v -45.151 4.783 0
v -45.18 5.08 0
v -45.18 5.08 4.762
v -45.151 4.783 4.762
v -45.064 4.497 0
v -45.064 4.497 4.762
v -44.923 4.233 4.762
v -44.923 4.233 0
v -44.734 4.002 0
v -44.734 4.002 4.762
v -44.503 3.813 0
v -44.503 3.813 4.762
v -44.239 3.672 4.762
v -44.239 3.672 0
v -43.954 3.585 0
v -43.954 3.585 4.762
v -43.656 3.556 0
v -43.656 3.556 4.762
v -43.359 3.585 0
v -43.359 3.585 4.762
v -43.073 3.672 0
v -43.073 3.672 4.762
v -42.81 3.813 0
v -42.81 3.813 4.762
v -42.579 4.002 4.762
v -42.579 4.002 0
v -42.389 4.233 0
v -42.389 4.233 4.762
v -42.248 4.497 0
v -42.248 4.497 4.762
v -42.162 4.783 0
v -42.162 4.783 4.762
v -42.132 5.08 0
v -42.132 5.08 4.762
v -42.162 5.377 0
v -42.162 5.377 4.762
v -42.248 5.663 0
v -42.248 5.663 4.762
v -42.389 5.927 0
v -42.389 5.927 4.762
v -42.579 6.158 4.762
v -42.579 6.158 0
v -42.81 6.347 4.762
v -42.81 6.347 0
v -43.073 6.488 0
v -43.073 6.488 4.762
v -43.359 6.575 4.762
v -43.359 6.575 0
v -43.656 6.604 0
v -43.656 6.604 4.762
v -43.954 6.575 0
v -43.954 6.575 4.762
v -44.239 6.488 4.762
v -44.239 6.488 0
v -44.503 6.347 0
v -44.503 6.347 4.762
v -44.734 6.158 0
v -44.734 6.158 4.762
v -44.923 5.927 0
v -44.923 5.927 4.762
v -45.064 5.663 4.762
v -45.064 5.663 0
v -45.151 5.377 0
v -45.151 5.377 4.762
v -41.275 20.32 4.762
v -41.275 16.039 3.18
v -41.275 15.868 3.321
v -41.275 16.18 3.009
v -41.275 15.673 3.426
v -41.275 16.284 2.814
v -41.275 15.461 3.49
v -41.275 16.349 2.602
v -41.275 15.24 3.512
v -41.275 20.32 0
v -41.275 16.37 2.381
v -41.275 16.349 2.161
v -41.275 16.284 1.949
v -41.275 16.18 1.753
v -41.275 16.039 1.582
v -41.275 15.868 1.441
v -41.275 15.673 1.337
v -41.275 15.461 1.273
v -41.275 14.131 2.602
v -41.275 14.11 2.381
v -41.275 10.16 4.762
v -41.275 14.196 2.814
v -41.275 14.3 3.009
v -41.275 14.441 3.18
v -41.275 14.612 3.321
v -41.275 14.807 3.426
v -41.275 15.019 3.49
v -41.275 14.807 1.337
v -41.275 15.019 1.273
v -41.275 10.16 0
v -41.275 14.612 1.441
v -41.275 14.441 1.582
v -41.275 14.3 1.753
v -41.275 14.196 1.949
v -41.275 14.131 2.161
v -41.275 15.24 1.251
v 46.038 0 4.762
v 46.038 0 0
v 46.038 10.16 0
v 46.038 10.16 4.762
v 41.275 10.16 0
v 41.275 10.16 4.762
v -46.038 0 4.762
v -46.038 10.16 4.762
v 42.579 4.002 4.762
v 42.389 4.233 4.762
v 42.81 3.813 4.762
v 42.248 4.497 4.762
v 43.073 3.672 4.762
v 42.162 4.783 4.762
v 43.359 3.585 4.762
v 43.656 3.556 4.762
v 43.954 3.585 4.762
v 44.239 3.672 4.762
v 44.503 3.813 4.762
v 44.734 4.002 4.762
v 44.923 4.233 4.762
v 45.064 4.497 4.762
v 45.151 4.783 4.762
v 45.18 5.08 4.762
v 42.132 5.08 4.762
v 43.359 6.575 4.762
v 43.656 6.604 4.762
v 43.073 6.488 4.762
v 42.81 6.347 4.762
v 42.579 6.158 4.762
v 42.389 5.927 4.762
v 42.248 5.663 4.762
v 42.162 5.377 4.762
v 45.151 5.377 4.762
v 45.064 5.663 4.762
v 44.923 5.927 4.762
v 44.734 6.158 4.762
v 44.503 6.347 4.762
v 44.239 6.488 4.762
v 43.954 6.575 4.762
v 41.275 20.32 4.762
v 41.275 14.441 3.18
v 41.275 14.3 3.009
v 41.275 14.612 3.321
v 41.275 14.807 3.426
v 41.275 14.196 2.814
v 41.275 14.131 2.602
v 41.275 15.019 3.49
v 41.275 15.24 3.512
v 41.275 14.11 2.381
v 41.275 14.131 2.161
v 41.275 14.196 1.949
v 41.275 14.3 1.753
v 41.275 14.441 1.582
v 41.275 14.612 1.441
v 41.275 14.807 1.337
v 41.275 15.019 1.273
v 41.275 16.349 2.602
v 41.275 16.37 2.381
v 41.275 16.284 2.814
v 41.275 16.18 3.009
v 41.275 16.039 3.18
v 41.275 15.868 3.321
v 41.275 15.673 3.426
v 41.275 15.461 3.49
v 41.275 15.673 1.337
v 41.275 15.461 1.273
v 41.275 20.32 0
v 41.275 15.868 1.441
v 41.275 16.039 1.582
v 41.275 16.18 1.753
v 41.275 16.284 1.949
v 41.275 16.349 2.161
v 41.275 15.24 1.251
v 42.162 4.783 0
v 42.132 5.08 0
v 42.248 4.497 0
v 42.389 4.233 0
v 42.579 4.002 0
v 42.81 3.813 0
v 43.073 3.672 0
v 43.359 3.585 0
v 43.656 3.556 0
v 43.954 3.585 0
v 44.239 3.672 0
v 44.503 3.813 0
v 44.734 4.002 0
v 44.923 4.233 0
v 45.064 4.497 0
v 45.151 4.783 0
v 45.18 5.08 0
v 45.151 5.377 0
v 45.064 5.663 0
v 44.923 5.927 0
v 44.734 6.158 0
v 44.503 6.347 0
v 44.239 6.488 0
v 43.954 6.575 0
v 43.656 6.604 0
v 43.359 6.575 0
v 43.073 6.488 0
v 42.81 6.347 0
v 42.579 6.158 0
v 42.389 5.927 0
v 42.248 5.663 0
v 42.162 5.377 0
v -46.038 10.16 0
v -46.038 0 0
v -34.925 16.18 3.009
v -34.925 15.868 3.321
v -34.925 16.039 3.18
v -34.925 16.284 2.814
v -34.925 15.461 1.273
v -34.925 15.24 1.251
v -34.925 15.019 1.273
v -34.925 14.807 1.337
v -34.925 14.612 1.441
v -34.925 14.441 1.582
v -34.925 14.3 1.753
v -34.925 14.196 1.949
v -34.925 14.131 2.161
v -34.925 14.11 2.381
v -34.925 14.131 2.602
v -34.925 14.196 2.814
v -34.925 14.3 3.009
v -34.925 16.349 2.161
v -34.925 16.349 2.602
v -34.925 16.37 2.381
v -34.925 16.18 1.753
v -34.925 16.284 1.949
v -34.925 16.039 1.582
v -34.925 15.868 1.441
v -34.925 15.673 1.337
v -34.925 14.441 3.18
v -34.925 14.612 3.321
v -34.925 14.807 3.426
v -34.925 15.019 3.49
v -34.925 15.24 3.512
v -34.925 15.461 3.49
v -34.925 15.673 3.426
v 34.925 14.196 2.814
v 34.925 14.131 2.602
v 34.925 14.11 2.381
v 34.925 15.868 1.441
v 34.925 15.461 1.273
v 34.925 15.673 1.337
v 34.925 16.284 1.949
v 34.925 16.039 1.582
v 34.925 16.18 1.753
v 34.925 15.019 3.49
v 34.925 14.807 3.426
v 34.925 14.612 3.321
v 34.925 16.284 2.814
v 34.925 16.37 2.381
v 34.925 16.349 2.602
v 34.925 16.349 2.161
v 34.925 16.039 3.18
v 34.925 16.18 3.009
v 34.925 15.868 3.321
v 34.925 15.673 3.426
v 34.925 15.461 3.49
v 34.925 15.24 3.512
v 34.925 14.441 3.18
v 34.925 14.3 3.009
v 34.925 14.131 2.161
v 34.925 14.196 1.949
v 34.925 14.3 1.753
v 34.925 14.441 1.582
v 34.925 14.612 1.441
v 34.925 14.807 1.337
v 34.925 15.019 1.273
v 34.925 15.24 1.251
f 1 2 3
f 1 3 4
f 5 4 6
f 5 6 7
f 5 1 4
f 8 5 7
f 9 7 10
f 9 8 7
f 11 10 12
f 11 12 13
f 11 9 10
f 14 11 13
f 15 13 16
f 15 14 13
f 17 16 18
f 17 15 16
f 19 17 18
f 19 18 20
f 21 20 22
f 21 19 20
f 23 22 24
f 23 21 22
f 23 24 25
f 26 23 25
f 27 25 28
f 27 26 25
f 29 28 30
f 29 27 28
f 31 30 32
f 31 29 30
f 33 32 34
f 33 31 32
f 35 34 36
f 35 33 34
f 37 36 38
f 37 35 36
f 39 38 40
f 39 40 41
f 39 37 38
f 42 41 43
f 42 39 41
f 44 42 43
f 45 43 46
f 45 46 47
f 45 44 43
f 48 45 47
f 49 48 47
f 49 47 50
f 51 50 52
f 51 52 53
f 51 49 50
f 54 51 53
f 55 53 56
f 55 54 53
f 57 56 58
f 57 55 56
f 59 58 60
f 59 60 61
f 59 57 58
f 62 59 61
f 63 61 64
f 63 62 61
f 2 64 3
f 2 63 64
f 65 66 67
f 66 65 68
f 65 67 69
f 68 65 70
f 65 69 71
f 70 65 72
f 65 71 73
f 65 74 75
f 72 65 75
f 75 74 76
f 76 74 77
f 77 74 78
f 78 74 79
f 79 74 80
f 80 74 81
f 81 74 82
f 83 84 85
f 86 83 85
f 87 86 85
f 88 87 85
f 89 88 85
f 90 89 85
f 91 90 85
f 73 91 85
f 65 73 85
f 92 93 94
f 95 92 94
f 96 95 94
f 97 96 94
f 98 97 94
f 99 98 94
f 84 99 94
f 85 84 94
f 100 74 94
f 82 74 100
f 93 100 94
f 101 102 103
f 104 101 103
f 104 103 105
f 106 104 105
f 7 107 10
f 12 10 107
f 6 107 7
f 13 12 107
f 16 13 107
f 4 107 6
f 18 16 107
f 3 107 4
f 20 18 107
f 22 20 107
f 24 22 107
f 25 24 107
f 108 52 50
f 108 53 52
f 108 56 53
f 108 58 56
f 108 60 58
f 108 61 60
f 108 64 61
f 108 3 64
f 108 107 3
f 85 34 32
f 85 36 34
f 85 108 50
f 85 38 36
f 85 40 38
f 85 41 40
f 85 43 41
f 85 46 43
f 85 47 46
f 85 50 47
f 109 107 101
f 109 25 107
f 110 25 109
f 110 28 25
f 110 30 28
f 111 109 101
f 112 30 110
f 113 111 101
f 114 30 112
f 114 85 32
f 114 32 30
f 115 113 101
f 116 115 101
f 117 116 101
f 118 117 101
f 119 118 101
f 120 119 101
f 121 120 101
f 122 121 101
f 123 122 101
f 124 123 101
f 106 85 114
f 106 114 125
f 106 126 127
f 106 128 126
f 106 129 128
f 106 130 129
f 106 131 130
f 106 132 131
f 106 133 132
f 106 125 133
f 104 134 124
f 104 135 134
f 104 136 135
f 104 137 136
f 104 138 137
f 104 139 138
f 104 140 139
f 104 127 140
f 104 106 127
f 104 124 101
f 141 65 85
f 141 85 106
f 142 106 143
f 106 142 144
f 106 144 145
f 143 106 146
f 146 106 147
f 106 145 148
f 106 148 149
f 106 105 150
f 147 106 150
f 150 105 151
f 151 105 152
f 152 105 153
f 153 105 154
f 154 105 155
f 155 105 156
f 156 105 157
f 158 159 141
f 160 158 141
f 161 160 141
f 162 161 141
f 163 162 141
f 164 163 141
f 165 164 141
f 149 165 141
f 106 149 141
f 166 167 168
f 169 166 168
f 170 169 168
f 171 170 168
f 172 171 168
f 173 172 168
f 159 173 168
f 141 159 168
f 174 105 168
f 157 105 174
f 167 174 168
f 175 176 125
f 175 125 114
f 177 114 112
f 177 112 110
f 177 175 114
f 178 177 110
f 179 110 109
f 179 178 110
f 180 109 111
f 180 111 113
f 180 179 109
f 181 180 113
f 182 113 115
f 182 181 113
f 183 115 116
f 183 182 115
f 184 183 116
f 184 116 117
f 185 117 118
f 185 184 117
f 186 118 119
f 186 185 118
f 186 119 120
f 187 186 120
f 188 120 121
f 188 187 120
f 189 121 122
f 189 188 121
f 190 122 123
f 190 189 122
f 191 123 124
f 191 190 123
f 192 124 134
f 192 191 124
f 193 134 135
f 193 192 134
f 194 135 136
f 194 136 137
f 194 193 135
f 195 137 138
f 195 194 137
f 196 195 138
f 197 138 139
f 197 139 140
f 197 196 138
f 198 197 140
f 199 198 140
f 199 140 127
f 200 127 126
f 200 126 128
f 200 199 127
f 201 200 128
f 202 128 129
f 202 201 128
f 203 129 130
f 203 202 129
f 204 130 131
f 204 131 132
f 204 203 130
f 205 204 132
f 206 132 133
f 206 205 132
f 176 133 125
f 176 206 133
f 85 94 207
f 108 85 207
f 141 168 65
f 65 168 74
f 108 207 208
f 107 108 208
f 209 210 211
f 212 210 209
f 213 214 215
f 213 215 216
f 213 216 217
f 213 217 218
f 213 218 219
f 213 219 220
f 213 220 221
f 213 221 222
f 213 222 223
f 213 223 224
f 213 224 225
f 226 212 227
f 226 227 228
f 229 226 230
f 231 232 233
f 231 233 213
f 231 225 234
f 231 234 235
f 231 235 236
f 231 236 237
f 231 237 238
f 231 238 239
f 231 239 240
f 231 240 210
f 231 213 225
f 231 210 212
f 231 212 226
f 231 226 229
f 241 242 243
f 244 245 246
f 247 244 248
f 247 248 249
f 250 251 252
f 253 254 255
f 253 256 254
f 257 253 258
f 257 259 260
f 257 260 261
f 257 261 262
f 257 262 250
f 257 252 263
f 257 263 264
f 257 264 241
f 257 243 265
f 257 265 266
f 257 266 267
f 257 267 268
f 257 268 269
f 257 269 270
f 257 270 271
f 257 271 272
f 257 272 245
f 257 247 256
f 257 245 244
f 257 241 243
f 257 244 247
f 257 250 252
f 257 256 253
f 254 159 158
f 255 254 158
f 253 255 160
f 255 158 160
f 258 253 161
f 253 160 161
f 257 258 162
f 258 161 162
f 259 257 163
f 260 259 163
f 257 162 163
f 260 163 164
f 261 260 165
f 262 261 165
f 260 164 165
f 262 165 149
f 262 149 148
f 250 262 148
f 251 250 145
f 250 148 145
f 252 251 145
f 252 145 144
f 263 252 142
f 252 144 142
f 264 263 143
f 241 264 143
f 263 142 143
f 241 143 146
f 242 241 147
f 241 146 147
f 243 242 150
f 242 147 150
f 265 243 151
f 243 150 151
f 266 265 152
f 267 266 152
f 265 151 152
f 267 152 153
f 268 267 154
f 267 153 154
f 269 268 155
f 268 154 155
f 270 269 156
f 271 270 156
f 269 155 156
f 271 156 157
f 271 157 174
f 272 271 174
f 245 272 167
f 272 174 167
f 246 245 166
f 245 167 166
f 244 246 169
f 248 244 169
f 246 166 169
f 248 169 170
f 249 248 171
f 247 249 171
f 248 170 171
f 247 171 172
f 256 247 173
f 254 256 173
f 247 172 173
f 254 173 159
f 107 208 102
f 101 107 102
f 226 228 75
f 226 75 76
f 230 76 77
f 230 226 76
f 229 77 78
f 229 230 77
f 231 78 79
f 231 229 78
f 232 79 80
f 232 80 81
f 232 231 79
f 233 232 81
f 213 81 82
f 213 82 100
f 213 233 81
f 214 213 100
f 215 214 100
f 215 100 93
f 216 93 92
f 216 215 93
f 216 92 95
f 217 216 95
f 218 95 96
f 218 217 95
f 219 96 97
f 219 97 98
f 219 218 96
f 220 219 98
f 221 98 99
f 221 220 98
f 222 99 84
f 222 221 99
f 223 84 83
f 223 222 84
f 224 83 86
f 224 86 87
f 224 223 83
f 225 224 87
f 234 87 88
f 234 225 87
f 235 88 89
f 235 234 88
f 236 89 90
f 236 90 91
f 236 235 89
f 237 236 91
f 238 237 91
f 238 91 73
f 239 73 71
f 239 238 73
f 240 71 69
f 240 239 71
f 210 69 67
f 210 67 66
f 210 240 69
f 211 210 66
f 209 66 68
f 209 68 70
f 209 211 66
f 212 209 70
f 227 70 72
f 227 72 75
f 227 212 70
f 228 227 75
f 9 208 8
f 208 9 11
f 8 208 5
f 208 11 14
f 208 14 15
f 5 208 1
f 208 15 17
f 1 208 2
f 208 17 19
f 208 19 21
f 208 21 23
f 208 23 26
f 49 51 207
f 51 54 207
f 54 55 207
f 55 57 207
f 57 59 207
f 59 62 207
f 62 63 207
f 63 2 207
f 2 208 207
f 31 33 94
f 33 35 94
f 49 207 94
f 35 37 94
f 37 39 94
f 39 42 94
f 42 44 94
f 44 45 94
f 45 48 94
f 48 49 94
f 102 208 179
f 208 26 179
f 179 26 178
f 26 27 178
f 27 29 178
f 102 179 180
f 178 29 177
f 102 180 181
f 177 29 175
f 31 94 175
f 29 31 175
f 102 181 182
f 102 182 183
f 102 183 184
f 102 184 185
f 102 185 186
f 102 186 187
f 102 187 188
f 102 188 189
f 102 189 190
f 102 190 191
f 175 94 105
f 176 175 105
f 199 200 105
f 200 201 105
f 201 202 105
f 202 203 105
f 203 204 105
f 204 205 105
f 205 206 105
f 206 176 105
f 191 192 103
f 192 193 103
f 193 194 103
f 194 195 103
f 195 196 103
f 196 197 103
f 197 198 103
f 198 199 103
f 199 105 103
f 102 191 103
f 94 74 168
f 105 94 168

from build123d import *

# Parameters (mm, degrees)
SKETCH1_R           = 1.524
BOSS_EXTRUDE1_DEPTH = 4.7625
SKETCH2_R           = 1.1303
CUT_EXTRUDE1_DEPTH  = 6.35
CUT_EXTRUDE2_START  = -6.35
SKETCH3_R           = 1.1303
CUT_EXTRUDE2_DEPTH  = 6.35


with BuildPart() as part:
    # Sketch1 → Boss-Extrude1 (new body)
    with BuildSketch(Plane.XY):
        Polygon((-46.0375, 0), (46.0375, 0), (46.0375, 10.16), (41.275, 10.16), (41.275, 20.32), (-41.275, 20.32), (-41.275, 10.16), (-46.0375, 10.16), align=None)
        with Locations(Location((-43.65625, 5.08, 0), (0, 0, 180))):
            Circle(SKETCH1_R, mode=Mode.SUBTRACT)
        with Locations(Location((43.65625, 5.08, 0), (0, 0, 180))):
            Circle(SKETCH1_R, mode=Mode.SUBTRACT)
    extrude(amount=BOSS_EXTRUDE1_DEPTH)

    # Sketch2 → Cut-Extrude1 (cut)
    with BuildSketch(Plane(origin=(41.275, 0, 0), x_dir=(0, 0, -1), z_dir=(1, 0, 0))):
        with Locations(Location((-2.38125, 15.24, 0), (0, 0, 90))):
            Circle(SKETCH2_R)
    extrude(amount=-CUT_EXTRUDE1_DEPTH, mode=Mode.SUBTRACT)

    # Sketch3 → Cut-Extrude2 (cut)
    with BuildSketch(Plane.ZY.offset(41.275).offset(CUT_EXTRUDE2_START)):
        with Locations(Location((2.38125, 15.24, 0), (0, 0, 90))):
            Circle(SKETCH3_R)
    extrude(amount=CUT_EXTRUDE2_DEPTH, mode=Mode.SUBTRACT)


solid = part.part
